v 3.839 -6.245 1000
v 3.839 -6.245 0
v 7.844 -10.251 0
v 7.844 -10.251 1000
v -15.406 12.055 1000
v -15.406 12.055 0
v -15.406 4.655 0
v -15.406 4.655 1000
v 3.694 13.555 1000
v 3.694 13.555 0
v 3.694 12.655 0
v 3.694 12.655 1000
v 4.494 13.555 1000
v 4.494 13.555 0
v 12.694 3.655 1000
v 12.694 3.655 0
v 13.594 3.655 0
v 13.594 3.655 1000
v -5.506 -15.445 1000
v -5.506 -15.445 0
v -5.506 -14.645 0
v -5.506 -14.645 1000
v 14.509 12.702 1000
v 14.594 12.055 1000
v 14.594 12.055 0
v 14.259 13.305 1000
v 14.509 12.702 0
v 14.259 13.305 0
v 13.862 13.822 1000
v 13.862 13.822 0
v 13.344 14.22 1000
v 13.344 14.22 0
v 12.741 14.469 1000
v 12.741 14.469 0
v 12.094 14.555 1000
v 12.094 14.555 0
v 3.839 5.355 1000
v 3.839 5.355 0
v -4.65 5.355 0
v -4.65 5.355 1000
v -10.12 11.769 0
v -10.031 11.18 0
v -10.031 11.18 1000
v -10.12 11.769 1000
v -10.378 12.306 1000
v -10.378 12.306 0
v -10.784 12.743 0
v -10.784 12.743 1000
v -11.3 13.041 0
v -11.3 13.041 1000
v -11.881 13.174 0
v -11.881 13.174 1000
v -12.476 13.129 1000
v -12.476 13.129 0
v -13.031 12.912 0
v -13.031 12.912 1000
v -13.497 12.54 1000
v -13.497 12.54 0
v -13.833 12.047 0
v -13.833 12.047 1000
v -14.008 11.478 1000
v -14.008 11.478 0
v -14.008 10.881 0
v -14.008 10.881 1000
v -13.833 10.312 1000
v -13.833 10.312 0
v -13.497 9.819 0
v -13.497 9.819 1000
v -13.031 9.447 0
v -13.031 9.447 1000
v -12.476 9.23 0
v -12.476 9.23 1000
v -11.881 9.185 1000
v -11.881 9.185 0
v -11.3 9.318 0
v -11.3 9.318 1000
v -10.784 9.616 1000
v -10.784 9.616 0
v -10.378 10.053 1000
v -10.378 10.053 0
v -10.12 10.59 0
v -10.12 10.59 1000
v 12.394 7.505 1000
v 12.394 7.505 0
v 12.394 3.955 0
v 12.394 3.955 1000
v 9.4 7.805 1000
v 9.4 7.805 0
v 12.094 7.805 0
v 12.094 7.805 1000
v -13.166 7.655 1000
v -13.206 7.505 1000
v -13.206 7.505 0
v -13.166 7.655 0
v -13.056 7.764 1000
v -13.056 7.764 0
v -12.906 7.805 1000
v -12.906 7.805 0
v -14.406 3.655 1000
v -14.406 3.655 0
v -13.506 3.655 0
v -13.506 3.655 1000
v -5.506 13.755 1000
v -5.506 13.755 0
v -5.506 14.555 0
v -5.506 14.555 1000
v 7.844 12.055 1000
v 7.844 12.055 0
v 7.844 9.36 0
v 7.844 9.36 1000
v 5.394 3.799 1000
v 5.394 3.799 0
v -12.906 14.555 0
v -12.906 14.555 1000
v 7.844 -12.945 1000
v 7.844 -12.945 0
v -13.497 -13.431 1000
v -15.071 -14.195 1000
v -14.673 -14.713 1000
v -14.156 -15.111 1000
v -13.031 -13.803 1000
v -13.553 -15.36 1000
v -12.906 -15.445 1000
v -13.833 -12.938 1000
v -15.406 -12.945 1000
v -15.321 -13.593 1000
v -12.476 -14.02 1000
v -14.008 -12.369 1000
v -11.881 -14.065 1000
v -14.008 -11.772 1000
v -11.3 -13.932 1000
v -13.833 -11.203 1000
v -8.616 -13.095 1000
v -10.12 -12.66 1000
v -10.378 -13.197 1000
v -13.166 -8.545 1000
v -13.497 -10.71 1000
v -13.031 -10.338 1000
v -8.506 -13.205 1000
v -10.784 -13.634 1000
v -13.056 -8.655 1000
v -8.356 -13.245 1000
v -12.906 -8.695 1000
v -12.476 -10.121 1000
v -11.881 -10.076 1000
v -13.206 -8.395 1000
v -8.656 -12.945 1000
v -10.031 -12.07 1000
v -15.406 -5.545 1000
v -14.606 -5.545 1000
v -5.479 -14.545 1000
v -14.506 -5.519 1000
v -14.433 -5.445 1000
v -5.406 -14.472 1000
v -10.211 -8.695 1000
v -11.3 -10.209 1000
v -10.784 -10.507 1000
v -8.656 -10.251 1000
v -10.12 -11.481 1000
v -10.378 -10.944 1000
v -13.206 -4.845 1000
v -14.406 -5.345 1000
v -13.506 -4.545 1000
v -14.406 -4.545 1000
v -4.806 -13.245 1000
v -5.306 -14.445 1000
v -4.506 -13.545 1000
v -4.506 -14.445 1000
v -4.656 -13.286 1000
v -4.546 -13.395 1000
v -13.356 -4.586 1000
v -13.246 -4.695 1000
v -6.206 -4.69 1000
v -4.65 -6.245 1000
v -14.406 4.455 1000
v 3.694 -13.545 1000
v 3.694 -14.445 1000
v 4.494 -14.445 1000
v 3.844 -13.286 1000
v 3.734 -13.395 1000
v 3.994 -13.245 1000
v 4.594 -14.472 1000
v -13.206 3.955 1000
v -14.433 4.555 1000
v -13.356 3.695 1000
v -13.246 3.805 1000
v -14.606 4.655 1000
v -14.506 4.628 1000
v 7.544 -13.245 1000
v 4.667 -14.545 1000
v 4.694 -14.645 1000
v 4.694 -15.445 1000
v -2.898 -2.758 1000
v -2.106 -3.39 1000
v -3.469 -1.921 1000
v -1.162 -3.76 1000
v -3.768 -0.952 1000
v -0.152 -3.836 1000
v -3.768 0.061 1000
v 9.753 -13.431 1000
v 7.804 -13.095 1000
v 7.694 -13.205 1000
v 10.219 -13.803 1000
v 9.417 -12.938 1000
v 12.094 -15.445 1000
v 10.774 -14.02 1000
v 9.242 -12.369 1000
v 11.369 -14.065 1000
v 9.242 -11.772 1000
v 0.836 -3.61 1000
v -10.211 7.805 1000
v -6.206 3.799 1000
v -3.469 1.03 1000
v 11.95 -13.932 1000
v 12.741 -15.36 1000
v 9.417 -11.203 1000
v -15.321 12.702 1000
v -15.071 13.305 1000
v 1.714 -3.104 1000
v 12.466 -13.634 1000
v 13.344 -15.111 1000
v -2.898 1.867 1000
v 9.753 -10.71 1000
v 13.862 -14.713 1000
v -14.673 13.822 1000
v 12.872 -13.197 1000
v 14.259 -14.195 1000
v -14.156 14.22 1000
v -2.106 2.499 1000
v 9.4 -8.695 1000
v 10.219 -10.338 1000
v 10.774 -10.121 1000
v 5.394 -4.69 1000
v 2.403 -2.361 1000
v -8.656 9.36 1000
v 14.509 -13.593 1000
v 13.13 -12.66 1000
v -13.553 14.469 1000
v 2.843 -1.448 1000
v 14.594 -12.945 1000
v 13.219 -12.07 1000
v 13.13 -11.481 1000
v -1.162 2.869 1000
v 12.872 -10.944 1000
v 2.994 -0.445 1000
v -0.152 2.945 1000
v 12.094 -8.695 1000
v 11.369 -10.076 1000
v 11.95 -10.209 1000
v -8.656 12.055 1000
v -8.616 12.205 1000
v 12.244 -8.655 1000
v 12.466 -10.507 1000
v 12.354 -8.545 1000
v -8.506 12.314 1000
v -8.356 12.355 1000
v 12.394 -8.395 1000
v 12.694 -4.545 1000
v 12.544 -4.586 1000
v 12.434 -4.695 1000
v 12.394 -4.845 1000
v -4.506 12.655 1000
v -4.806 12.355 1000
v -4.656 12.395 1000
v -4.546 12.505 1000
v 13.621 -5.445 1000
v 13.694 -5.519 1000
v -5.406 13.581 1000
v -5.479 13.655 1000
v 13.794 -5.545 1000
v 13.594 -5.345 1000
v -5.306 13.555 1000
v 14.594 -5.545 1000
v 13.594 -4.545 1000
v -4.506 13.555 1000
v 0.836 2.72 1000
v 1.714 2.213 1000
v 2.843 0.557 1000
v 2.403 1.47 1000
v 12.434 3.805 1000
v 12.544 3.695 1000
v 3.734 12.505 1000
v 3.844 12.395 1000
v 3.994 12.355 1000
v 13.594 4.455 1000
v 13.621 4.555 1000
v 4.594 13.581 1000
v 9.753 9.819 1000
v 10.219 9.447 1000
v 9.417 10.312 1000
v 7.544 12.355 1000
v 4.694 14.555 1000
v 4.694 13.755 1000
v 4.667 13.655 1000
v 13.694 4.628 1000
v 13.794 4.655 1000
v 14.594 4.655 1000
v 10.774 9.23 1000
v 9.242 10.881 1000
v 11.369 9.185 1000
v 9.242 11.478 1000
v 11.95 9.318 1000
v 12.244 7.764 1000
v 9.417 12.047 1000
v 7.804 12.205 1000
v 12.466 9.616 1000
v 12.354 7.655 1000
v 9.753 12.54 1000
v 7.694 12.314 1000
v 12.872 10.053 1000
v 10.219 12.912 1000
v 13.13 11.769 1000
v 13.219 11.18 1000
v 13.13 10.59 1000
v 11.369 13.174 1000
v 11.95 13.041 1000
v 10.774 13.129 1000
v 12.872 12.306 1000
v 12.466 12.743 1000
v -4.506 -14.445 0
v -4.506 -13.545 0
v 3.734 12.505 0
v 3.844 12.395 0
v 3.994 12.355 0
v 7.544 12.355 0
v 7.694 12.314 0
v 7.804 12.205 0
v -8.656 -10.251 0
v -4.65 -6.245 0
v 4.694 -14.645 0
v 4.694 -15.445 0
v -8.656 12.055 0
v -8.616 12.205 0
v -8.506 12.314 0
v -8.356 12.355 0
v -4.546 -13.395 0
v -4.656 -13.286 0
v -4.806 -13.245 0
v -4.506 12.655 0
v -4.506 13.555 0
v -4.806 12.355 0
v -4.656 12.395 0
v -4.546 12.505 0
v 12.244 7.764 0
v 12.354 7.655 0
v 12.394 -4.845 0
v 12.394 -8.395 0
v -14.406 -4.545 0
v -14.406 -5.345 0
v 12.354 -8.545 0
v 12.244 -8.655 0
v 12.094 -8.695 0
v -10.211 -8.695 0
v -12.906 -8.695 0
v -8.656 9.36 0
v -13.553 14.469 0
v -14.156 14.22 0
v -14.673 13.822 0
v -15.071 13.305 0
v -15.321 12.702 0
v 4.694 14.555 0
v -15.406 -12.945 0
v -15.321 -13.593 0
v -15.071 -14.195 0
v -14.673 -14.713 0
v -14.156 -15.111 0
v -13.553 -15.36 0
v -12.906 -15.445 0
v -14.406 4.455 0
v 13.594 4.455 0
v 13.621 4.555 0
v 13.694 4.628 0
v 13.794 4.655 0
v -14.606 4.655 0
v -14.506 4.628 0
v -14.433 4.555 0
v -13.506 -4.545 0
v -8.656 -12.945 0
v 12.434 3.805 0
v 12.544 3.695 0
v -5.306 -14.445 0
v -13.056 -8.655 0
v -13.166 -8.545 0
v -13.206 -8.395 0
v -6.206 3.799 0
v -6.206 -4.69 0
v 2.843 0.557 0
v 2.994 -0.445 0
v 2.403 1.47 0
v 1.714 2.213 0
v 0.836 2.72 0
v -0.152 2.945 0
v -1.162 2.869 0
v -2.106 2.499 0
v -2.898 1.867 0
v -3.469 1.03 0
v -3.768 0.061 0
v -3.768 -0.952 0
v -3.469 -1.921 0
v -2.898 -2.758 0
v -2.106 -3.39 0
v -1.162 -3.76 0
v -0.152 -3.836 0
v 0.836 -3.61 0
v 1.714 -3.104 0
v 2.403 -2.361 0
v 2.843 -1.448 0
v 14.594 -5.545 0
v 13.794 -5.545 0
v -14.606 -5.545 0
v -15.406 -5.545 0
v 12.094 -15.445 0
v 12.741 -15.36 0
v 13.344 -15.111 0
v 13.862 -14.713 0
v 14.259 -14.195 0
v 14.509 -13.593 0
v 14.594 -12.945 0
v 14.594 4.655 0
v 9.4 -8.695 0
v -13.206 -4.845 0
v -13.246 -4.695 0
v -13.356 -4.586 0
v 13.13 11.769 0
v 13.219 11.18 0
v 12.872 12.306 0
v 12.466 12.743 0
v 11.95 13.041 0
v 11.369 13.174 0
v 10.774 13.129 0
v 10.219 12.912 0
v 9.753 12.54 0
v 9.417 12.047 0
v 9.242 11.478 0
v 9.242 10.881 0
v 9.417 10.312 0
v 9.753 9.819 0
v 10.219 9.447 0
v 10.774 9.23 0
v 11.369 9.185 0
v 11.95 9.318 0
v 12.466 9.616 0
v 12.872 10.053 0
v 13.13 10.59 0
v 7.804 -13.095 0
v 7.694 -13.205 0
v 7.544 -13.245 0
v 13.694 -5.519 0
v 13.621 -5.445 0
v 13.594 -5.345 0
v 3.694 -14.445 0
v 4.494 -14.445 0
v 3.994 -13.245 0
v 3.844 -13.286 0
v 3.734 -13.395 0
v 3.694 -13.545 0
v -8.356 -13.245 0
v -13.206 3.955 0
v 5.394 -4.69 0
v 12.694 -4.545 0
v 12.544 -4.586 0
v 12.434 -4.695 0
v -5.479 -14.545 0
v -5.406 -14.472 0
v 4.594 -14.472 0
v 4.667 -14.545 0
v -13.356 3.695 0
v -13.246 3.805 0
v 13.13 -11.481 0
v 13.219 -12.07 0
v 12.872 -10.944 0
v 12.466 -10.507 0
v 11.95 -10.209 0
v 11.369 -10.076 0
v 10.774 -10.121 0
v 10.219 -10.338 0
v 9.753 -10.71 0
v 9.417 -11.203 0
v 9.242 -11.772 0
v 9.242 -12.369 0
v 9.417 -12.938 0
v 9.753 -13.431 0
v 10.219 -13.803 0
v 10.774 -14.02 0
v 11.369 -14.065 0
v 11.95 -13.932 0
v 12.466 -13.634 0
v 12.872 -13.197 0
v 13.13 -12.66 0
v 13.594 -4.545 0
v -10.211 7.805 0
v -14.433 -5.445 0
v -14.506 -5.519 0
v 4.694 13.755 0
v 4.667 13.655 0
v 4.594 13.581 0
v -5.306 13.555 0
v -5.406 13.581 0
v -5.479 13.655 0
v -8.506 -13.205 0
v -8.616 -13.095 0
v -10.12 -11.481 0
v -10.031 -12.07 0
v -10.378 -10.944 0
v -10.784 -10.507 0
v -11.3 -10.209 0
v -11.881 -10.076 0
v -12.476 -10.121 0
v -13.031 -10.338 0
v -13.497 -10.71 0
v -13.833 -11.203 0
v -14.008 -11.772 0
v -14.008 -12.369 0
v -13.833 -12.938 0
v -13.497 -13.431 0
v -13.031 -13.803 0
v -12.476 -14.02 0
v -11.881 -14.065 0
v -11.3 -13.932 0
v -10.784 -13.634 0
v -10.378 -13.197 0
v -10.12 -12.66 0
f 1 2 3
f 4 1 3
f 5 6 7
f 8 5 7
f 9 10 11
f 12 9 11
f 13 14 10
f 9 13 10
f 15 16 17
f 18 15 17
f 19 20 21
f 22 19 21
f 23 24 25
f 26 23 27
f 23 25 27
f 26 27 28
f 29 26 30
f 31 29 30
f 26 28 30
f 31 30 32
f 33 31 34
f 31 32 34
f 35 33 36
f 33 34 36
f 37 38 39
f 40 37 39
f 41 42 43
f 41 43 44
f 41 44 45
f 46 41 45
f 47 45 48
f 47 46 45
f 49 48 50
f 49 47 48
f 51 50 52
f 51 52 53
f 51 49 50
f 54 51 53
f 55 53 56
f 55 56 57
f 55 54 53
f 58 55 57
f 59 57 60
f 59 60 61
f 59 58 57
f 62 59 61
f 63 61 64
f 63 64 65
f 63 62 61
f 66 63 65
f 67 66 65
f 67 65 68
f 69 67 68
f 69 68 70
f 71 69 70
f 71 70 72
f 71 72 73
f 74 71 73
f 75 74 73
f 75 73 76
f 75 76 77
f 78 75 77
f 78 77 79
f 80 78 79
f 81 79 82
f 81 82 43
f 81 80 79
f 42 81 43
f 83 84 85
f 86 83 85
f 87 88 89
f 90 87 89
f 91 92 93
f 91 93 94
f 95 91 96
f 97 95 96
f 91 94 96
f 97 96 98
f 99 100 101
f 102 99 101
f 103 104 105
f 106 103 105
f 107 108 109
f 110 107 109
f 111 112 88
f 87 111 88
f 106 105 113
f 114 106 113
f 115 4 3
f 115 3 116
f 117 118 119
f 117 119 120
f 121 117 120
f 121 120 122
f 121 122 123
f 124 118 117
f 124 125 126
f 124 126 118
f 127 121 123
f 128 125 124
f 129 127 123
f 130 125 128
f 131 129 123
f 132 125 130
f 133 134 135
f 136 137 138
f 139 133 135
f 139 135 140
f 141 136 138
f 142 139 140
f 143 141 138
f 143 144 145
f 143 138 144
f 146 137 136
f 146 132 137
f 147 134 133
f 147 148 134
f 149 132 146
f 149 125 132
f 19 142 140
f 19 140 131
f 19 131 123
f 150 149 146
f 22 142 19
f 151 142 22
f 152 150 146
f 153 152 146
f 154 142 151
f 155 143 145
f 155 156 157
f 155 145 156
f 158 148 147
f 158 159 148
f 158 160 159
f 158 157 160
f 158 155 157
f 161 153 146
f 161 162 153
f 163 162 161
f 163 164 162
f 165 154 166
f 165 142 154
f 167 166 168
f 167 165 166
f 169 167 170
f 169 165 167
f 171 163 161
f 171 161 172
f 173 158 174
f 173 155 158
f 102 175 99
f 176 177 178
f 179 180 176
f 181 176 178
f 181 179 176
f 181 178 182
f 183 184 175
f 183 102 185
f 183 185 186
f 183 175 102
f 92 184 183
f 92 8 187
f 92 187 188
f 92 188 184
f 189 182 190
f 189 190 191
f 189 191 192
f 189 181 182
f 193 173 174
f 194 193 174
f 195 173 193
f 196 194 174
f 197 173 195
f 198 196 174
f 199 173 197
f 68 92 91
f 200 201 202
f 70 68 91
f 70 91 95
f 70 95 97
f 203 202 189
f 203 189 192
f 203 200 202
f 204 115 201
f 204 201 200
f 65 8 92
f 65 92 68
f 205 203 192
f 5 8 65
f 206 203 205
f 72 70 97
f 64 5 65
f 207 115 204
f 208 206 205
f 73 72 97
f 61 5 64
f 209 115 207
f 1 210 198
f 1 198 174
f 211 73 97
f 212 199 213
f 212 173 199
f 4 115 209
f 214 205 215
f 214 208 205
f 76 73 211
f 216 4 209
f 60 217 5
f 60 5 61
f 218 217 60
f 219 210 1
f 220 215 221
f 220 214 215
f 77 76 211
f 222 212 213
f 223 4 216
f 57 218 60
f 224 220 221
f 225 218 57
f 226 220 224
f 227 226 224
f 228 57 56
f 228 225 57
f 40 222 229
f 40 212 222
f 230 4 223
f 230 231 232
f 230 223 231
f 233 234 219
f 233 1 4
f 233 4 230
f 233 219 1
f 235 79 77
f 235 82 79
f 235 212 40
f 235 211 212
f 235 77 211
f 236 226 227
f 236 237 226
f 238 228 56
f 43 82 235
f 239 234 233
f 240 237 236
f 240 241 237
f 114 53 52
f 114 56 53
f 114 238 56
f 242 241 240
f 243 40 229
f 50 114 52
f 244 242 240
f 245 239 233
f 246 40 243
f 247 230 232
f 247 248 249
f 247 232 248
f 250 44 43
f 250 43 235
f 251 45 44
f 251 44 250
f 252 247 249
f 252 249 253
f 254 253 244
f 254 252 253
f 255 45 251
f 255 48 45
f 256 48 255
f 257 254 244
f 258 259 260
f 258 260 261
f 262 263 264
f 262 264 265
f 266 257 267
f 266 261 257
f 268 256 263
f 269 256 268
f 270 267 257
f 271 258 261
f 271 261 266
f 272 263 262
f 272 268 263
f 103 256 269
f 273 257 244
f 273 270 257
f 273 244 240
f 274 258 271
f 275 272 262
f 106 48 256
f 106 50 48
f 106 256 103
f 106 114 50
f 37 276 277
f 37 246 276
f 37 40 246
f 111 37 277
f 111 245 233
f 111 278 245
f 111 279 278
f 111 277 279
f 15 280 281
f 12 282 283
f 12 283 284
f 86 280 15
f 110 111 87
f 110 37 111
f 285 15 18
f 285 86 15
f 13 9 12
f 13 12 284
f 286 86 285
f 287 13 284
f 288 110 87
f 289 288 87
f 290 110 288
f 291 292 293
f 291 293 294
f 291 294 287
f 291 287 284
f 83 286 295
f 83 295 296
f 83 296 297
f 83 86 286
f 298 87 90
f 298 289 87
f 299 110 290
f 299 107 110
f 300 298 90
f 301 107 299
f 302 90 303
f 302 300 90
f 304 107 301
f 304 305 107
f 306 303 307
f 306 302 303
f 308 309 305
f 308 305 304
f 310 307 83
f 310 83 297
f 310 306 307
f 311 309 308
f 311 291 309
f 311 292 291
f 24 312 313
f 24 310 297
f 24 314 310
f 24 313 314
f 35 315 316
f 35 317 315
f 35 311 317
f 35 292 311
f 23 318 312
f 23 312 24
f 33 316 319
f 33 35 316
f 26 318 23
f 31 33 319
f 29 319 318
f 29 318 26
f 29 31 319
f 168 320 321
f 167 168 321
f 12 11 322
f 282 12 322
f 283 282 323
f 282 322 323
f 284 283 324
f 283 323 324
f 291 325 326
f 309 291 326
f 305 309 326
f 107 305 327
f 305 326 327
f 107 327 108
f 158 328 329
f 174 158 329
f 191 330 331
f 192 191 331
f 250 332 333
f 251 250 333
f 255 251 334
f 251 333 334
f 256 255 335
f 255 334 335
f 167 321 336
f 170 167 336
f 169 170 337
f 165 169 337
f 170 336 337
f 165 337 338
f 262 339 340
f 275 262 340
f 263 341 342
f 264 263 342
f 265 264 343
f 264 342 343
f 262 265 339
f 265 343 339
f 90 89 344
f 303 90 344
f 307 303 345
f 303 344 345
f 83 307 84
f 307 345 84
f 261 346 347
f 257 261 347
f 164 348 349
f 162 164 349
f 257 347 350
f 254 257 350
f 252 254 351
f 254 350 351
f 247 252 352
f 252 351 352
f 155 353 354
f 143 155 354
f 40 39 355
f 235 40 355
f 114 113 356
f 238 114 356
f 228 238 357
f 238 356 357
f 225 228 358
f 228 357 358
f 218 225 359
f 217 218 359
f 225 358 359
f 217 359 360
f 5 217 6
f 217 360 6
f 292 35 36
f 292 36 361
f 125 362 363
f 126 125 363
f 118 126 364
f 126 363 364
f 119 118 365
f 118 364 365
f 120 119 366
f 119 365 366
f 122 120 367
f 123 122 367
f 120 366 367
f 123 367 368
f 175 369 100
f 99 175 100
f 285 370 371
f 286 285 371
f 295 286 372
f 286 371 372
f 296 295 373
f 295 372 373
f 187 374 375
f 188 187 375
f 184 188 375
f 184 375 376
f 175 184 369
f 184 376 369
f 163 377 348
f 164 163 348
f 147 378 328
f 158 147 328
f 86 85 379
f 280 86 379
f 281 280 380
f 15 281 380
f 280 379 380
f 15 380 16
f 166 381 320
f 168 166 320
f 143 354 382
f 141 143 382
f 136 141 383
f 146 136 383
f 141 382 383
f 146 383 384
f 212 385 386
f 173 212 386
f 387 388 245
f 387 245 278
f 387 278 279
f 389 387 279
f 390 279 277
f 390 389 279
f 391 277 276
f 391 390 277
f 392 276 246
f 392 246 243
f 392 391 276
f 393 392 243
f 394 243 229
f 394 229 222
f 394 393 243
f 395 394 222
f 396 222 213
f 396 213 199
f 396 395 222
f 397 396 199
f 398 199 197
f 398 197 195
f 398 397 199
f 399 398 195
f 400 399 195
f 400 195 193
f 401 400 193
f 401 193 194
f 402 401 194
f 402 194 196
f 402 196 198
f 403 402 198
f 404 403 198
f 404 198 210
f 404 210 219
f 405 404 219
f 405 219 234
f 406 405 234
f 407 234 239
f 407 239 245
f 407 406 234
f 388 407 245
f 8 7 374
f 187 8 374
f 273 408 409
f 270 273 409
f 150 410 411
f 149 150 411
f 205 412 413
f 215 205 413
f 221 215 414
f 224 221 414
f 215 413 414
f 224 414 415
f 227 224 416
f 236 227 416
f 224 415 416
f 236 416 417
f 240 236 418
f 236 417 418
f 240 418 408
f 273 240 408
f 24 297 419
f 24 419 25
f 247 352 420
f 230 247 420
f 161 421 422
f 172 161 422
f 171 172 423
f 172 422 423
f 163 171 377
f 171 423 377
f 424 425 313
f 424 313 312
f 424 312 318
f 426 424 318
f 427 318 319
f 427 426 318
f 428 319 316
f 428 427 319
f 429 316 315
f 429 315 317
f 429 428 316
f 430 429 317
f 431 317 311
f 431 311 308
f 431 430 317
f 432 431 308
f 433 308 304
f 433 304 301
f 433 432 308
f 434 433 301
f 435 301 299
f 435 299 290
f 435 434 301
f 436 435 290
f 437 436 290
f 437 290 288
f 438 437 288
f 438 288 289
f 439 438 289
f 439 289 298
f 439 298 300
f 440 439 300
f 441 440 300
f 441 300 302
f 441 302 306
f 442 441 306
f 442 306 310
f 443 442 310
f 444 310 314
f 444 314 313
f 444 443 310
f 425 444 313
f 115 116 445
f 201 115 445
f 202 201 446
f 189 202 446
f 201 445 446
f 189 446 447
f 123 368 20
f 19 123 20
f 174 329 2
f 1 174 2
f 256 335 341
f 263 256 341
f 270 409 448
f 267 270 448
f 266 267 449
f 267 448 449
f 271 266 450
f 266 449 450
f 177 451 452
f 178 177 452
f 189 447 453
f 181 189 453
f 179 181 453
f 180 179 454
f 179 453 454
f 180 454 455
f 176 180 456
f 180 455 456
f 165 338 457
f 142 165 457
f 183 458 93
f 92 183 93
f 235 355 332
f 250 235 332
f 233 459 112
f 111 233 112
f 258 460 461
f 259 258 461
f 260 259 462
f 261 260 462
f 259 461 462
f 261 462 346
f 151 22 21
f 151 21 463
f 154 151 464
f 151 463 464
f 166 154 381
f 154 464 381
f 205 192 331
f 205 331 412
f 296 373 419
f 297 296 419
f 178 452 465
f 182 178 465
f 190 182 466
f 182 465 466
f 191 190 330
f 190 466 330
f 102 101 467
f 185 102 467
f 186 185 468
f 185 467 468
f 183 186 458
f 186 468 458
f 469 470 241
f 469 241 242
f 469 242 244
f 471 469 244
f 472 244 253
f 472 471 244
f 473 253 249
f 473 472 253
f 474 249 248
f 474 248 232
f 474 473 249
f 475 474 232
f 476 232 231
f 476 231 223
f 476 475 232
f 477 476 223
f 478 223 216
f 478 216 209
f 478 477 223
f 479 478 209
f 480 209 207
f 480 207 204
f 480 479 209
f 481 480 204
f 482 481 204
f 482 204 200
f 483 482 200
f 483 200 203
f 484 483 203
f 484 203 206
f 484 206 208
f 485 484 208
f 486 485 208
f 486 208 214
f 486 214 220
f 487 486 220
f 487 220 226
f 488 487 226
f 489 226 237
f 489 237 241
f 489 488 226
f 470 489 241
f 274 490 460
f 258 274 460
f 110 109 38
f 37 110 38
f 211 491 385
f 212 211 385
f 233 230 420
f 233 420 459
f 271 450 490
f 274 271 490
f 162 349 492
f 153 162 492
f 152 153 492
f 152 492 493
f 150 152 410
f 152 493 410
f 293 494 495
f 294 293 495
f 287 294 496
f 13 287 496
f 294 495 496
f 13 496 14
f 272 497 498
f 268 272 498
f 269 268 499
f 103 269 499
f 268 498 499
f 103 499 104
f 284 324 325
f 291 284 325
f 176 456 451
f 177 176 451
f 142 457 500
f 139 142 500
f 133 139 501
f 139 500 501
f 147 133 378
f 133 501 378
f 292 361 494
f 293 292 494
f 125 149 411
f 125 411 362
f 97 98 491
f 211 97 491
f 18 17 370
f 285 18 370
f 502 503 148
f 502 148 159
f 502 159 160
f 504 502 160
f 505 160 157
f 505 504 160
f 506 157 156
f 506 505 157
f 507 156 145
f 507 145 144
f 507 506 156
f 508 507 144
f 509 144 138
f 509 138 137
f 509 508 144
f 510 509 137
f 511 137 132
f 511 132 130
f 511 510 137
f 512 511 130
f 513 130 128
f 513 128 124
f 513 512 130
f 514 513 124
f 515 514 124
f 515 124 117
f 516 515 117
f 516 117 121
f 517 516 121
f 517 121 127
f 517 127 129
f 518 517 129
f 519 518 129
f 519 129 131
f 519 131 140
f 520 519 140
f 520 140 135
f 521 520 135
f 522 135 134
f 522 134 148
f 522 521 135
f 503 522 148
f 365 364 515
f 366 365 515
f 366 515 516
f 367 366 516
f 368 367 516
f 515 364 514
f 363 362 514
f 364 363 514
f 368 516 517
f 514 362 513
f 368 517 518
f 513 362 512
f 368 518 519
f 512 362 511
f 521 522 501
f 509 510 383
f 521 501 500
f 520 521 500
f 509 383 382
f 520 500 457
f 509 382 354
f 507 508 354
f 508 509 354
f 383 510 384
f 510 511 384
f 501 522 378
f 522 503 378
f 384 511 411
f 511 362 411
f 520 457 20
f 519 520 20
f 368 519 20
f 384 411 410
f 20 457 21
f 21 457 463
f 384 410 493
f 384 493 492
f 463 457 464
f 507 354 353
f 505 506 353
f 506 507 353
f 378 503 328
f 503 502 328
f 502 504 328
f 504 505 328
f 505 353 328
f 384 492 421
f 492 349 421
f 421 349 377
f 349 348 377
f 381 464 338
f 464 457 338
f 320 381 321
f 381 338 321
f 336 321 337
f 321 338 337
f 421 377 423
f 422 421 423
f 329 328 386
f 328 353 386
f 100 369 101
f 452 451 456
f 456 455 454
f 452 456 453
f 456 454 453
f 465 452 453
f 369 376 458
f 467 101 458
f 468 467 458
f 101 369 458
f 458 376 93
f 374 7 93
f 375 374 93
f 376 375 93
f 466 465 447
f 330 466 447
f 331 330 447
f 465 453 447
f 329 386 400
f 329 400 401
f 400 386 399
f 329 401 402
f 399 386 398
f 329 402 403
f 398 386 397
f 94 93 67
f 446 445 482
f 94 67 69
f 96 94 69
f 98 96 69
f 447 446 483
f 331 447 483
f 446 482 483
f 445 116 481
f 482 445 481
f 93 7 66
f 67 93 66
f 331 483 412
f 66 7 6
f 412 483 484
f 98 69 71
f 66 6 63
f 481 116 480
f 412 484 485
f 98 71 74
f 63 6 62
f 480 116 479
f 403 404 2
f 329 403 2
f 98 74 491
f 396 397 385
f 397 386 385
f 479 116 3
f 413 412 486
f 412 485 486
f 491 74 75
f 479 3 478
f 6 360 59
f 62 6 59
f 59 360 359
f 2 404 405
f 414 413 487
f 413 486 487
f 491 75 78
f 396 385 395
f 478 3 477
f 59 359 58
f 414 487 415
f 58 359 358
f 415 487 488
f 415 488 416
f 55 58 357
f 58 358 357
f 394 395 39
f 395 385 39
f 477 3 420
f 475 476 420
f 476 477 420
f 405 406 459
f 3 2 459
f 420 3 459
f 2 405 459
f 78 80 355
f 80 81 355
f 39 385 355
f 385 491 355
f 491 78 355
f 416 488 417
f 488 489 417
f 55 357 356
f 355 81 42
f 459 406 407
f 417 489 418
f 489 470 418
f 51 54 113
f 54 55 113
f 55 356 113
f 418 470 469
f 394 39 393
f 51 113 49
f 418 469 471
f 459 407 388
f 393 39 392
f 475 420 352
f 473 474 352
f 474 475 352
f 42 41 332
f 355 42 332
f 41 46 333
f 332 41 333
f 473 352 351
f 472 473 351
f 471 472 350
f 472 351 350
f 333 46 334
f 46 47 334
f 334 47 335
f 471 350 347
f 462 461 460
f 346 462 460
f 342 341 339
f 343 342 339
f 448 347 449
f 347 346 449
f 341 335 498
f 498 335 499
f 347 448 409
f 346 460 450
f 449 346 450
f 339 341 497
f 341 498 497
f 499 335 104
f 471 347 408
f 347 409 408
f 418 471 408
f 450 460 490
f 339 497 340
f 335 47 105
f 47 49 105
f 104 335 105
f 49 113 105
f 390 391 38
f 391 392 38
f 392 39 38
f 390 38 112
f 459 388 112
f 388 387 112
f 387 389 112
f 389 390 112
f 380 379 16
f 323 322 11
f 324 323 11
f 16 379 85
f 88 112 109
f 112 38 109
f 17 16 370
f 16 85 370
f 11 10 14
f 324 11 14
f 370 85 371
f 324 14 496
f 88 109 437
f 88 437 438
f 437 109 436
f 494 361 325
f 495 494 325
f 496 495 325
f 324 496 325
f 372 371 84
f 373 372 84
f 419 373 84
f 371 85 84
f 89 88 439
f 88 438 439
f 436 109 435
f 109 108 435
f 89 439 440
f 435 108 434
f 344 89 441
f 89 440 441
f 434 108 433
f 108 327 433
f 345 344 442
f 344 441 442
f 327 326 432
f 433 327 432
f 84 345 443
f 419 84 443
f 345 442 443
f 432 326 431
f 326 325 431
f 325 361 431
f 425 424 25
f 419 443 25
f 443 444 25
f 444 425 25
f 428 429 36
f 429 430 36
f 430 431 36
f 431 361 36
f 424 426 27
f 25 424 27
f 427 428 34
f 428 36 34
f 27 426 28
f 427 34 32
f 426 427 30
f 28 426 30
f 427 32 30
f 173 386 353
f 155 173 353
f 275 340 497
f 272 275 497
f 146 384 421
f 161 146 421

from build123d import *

# Parameters (mm, degrees)
SKETCH_1_R      = 3.4
SKETCH_1_R_2    = 2
EXTRUDE_1_DEPTH = 1000


with BuildPart() as part:
    # 草图1 → 凸台-拉伸1 (new body)
    with BuildSketch(Plane.XY):
        with BuildLine():
            Line((5.39426949, 3.798904284), (9.399904408, 7.804539202))
            Line((9.399904408, 7.804539202), (12.09426949, 7.804539202))
            ThreePointArc((12.09426949, 7.804539202), (12.306401524, 7.716671237), (12.39426949, 7.504539202))
            Line((12.39426949, 7.504539202), (12.39426949, 3.954539202))
            ThreePointArc((12.39426949, 3.954539202), (12.482137455, 3.742407168), (12.69426949, 3.654539202))
            Line((12.69426949, 3.654539202), (13.59426949, 3.654539202))
            Line((13.59426949, 3.654539202), (13.59426949, 4.454539202))
            ThreePointArc((13.59426949, 4.454539202), (13.652848133, 4.595960558), (13.79426949, 4.654539202))
            Line((13.79426949, 4.654539202), (14.59426949, 4.654539202))
            Line((14.59426949, 4.654539202), (14.59426949, 12.054539202))
            ThreePointArc((14.59426949, 12.054539202), (13.862036443, 13.822306155), (12.09426949, 14.554539202))
            Line((12.09426949, 14.554539202), (4.69426949, 14.554539202))
            Line((4.69426949, 14.554539202), (4.69426949, 13.754539202))
            ThreePointArc((4.69426949, 13.754539202), (4.635690846, 13.613117846), (4.49426949, 13.554539202))
            Line((4.49426949, 13.554539202), (3.69426949, 13.554539202))
            Line((3.69426949, 13.554539202), (3.69426949, 12.654539202))
            ThreePointArc((3.69426949, 12.654539202), (3.782137455, 12.442407168), (3.99426949, 12.354539202))
            Line((3.99426949, 12.354539202), (7.54426949, 12.354539202))
            ThreePointArc((7.54426949, 12.354539202), (7.756401524, 12.266671237), (7.84426949, 12.054539202))
            Line((7.84426949, 12.054539202), (7.84426949, 9.360174121))
            Line((7.84426949, 9.360174121), (3.838634571, 5.354539202))
            Line((3.838634571, 5.354539202), (-4.650095592, 5.354539202))
            Line((-4.650095592, 5.354539202), (-8.65573051, 9.360174121))
            Line((-8.65573051, 9.360174121), (-8.65573051, 12.054539202))
            ThreePointArc((-8.65573051, 12.054539202), (-8.567862545, 12.266671237), (-8.35573051, 12.354539202))
            Line((-8.35573051, 12.354539202), (-4.80573051, 12.354539202))
            ThreePointArc((-4.80573051, 12.354539202), (-4.593598476, 12.442407168), (-4.50573051, 12.654539202))
            Line((-4.50573051, 12.654539202), (-4.50573051, 13.554539202))
            Line((-4.50573051, 13.554539202), (-5.30573051, 13.554539202))
            ThreePointArc((-5.30573051, 13.554539202), (-5.447151867, 13.613117846), (-5.50573051, 13.754539202))
            Line((-5.50573051, 13.754539202), (-5.50573051, 14.554539202))
            Line((-5.50573051, 14.554539202), (-12.90573051, 14.554539202))
            ThreePointArc((-12.90573051, 14.554539202), (-14.673497463, 13.822306155), (-15.40573051, 12.054539202))
            Line((-15.40573051, 12.054539202), (-15.40573051, 4.654539202))
            Line((-15.40573051, 4.654539202), (-14.60573051, 4.654539202))
            ThreePointArc((-14.60573051, 4.654539202), (-14.464309154, 4.595960558), (-14.40573051, 4.454539202))
            Line((-14.40573051, 4.454539202), (-14.40573051, 3.654539202))
            Line((-14.40573051, 3.654539202), (-13.50573051, 3.654539202))
            ThreePointArc((-13.50573051, 3.654539202), (-13.293598476, 3.742407168), (-13.20573051, 3.954539202))
            Line((-13.20573051, 3.954539202), (-13.20573051, 7.504539202))
            ThreePointArc((-13.20573051, 7.504539202), (-13.117862545, 7.716671237), (-12.90573051, 7.804539202))
            Line((-12.90573051, 7.804539202), (-10.211365429, 7.804539202))
            Line((-10.211365429, 7.804539202), (-6.20573051, 3.798904284))
            Line((-6.20573051, 3.798904284), (-6.20573051, -4.689825879))
            Line((-6.20573051, -4.689825879), (-10.211365429, -8.695460798))
            Line((-10.211365429, -8.695460798), (-12.90573051, -8.695460798))
            ThreePointArc((-12.90573051, -8.695460798), (-13.117862545, -8.607592832), (-13.20573051, -8.395460798))
            Line((-13.20573051, -8.395460798), (-13.20573051, -4.845460798))
            ThreePointArc((-13.20573051, -4.845460798), (-13.293598476, -4.633328763), (-13.50573051, -4.545460798))
            Line((-13.50573051, -4.545460798), (-14.40573051, -4.545460798))
            Line((-14.40573051, -4.545460798), (-14.40573051, -5.345460798))
            ThreePointArc((-14.40573051, -5.345460798), (-14.464309154, -5.486882154), (-14.60573051, -5.545460798))
            Line((-14.60573051, -5.545460798), (-15.40573051, -5.545460798))
            Line((-15.40573051, -5.545460798), (-15.40573051, -12.945460798))
            ThreePointArc((-15.40573051, -12.945460798), (-14.673497463, -14.713227751), (-12.90573051, -15.445460798))
            Line((-12.90573051, -15.445460798), (-5.50573051, -15.445460798))
            Line((-5.50573051, -15.445460798), (-5.50573051, -14.645460798))
            ThreePointArc((-5.50573051, -14.645460798), (-5.447151867, -14.504039442), (-5.30573051, -14.445460798))
            Line((-5.30573051, -14.445460798), (-4.50573051, -14.445460798))
            Line((-4.50573051, -14.445460798), (-4.50573051, -13.545460798))
            ThreePointArc((-4.50573051, -13.545460798), (-4.593598476, -13.333328763), (-4.80573051, -13.245460798))
            Line((-4.80573051, -13.245460798), (-8.35573051, -13.245460798))
            ThreePointArc((-8.35573051, -13.245460798), (-8.567862545, -13.157592832), (-8.65573051, -12.945460798))
            Line((-8.65573051, -12.945460798), (-8.65573051, -10.251095716))
            Line((-8.65573051, -10.251095716), (-4.650095592, -6.245460798))
            Line((-4.650095592, -6.245460798), (3.838634571, -6.245460798))
            Line((3.838634571, -6.245460798), (7.84426949, -10.251095716))
            Line((7.84426949, -10.251095716), (7.84426949, -12.945460798))
            ThreePointArc((7.84426949, -12.945460798), (7.756401524, -13.157592832), (7.54426949, -13.245460798))
            Line((7.54426949, -13.245460798), (3.99426949, -13.245460798))
            ThreePointArc((3.99426949, -13.245460798), (3.782137455, -13.333328763), (3.69426949, -13.545460798))
            Line((3.69426949, -13.545460798), (3.69426949, -14.445460798))
            Line((3.69426949, -14.445460798), (4.49426949, -14.445460798))
            ThreePointArc((4.49426949, -14.445460798), (4.635690846, -14.504039442), (4.69426949, -14.645460798))
            Line((4.69426949, -14.645460798), (4.69426949, -15.445460798))
            Line((4.69426949, -15.445460798), (12.09426949, -15.445460798))
            ThreePointArc((12.09426949, -15.445460798), (13.862036443, -14.713227751), (14.59426949, -12.945460798))
            Line((14.59426949, -12.945460798), (14.59426949, -5.545460798))
            Line((14.59426949, -5.545460798), (13.79426949, -5.545460798))
            ThreePointArc((13.79426949, -5.545460798), (13.652848133, -5.486882154), (13.59426949, -5.345460798))
            Line((13.59426949, -5.345460798), (13.59426949, -4.545460798))
            Line((13.59426949, -4.545460798), (12.69426949, -4.545460798))
            ThreePointArc((12.69426949, -4.545460798), (12.482137455, -4.633328763), (12.39426949, -4.845460798))
            Line((12.39426949, -4.845460798), (12.39426949, -8.395460798))
            ThreePointArc((12.39426949, -8.395460798), (12.306401524, -8.607592832), (12.09426949, -8.695460798))
            Line((12.09426949, -8.695460798), (9.399904408, -8.695460798))
            Line((9.399904408, -8.695460798), (5.39426949, -4.689825879))
            Line((5.39426949, -4.689825879), (5.39426949, 3.798904284))
        make_face()
        with Locations((-0.40573051, -0.445460798)):
            Circle(SKETCH_1_R, mode=Mode.SUBTRACT)
        with Locations((-12.03073051, 11.179539202)):
            Circle(SKETCH_1_R_2, mode=Mode.SUBTRACT)
        with Locations((11.21926949, 11.179539202)):
            Circle(SKETCH_1_R_2, mode=Mode.SUBTRACT)
        with Locations((-12.03073051, -12.070460798)):
            Circle(SKETCH_1_R_2, mode=Mode.SUBTRACT)
        with Locations((11.21926949, -12.070460798)):
            Circle(SKETCH_1_R_2, mode=Mode.SUBTRACT)
    extrude(amount=EXTRUDE_1_DEPTH)


solid = part.part
